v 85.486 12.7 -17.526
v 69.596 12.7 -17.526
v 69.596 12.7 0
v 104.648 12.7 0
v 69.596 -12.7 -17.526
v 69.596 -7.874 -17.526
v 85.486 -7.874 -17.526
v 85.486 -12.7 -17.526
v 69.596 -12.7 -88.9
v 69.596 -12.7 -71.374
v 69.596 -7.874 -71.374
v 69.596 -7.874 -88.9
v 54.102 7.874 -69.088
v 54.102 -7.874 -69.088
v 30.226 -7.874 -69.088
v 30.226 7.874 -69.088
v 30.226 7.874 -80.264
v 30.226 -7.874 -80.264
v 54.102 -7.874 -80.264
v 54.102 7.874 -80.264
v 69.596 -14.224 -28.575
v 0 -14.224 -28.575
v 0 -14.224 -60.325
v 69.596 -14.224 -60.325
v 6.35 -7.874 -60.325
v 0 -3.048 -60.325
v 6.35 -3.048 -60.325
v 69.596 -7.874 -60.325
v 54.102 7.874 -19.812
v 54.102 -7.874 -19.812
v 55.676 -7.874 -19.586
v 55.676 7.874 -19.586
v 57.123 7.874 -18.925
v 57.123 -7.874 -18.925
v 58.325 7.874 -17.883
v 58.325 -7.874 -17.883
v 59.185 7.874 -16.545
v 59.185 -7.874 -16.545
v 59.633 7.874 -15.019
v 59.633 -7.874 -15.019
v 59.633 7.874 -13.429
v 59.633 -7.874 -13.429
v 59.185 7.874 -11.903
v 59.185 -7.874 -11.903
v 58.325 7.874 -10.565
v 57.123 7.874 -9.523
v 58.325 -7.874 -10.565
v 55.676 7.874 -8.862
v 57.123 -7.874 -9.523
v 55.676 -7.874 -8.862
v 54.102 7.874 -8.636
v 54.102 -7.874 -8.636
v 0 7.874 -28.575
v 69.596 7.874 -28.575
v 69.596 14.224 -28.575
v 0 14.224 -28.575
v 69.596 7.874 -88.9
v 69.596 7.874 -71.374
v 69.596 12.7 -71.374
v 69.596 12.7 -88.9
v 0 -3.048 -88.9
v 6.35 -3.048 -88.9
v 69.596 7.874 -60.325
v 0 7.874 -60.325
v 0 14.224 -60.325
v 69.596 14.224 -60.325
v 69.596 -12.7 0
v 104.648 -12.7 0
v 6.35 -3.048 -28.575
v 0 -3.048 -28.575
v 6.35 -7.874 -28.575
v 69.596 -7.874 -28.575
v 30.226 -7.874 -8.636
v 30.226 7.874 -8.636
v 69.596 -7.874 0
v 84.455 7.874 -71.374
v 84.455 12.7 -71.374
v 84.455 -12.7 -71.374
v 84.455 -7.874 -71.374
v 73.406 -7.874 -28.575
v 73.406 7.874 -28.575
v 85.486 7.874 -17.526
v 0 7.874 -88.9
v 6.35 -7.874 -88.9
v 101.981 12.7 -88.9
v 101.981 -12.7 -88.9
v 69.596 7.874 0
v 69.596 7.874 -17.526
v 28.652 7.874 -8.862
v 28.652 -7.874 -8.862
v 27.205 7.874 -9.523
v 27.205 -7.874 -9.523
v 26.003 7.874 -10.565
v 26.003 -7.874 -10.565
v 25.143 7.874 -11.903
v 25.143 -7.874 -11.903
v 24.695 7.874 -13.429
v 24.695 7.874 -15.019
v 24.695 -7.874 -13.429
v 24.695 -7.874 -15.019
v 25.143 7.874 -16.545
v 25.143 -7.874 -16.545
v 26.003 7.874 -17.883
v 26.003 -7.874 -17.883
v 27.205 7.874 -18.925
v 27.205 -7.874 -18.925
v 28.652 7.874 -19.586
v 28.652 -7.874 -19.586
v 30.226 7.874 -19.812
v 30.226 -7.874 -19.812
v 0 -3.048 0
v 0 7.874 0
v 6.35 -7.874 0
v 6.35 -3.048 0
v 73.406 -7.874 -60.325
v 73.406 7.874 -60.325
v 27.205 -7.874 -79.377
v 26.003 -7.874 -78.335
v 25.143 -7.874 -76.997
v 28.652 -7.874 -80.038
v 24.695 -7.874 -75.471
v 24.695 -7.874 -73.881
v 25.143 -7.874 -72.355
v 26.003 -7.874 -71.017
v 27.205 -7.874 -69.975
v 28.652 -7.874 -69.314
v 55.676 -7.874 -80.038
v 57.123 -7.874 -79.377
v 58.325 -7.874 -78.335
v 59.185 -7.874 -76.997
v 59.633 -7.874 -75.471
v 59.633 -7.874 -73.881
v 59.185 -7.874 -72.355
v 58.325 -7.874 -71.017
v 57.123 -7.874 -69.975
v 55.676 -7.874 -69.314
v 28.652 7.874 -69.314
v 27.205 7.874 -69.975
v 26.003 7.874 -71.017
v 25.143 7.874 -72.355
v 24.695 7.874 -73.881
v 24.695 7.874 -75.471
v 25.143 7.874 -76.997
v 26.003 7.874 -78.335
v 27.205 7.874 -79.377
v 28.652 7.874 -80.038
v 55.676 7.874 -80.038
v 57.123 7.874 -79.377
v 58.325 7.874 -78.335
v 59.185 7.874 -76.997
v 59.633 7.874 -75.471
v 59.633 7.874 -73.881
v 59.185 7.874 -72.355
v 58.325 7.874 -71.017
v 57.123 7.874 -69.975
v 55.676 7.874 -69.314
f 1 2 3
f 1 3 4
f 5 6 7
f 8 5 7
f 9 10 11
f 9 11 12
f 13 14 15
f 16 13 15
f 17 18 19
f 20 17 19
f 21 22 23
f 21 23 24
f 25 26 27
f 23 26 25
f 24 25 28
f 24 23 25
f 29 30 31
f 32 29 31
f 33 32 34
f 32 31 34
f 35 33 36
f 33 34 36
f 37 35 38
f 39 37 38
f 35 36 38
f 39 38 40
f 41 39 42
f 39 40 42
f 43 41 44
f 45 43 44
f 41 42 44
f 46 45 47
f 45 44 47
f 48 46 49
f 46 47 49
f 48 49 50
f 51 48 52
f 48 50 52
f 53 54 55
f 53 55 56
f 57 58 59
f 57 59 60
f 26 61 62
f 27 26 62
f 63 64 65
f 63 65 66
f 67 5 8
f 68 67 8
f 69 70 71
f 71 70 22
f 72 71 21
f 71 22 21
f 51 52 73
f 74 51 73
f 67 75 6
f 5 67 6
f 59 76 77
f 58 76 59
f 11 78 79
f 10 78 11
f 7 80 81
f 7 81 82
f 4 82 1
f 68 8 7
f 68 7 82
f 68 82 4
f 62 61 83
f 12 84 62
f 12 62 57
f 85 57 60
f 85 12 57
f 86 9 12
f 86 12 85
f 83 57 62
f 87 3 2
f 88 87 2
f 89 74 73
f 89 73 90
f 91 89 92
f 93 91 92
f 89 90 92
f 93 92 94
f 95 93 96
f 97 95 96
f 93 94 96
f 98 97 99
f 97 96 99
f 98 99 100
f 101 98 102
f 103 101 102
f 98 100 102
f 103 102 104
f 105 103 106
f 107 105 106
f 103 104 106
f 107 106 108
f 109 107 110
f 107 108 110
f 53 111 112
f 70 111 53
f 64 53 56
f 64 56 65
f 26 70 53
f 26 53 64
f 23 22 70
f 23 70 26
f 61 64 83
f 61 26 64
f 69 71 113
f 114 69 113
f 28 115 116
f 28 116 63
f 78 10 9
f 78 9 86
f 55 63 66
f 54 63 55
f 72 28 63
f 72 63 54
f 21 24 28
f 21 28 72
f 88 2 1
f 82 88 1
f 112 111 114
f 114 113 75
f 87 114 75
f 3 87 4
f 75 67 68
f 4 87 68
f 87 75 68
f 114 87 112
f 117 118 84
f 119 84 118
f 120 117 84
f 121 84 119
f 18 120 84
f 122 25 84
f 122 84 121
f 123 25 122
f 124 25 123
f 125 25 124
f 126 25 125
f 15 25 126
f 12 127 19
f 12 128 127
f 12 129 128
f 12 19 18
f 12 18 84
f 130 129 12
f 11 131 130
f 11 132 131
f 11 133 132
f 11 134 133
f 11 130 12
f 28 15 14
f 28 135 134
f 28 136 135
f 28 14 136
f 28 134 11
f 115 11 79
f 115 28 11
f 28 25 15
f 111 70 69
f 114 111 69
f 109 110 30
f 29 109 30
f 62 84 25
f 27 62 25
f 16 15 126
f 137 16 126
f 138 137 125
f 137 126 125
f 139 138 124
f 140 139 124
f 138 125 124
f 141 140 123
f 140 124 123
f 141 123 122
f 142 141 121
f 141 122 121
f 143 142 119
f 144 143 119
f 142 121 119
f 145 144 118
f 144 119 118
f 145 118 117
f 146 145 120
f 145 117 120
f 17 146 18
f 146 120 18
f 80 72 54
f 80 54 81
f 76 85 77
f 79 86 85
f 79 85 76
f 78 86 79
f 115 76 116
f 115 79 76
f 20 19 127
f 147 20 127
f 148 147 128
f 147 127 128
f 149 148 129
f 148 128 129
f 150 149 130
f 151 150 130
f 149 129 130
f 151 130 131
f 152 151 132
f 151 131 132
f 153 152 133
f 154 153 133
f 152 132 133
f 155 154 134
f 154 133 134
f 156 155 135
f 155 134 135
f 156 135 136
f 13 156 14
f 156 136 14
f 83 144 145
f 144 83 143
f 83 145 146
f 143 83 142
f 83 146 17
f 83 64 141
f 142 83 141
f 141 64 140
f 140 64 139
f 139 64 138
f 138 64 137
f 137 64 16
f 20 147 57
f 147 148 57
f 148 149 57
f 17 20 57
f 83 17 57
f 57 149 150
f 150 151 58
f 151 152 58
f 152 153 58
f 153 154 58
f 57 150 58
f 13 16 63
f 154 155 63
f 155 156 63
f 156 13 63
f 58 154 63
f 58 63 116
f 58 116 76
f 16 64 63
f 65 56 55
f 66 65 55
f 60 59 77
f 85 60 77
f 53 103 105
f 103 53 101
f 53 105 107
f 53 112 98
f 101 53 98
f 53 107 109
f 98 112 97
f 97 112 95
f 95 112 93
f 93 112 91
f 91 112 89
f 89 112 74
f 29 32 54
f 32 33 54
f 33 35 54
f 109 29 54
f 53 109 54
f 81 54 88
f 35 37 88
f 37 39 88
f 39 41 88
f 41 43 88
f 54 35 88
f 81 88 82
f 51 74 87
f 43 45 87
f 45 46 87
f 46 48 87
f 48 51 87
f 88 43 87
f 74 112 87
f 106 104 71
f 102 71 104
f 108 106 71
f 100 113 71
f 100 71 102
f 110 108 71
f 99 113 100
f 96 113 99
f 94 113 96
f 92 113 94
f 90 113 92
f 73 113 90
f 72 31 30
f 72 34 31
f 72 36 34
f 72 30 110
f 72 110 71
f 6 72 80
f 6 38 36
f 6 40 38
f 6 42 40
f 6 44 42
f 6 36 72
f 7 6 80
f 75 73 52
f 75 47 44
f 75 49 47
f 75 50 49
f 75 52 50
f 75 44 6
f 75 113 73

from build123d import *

# Parameters (mm, degrees)
F1_DEPTH = 14.224
F2_DEPTH = 7.874
F3_DEPTH = 12.7
F0_W     = 6.35
F0_H     = 28.575
F4_DEPTH = 7.874
F5_W     = 6.35
F5_H     = 28.575
F6_DEPTH = 4.826
F8_DEPTH = 22.099


with BuildPart() as f1:
    # F0 (on Front) → F1 (new body, symmetric)
    with BuildSketch(Plane.XZ):
        Polygon((6.35, -28.575), (0, -28.575), (0, -44.45), (0, -60.325), (6.35, -60.325), (69.596, -60.325), (69.596, -28.575), align=None)
    extrude(amount=F1_DEPTH, both=True)

    # F0 (on Front) → F2 (join, symmetric)
    with BuildSketch(Plane.XZ):
        Polygon((69.596, -60.325), (6.35, -60.325), (6.35, -88.9), (69.596, -88.9), (69.596, -71.374), (84.455, -71.374), (73.406, -60.325), align=None)
        Polygon((69.596, 0), (6.35, 0), (6.35, -28.575), (69.596, -28.575), (73.406, -28.575), (85.48624, -17.526), (69.596, -17.526), align=None)
    extrude(amount=F2_DEPTH, both=True)

    # F0 (on Front) → F3 (join, symmetric)
    with BuildSketch(Plane.XZ):
        Polygon((104.648, 0), (69.596, 0), (69.596, -17.526), (85.48624, -17.526), align=None)
        Polygon((69.596, -71.374), (69.596, -88.9), (101.981, -88.9), (84.455, -71.374), align=None)
    extrude(amount=F3_DEPTH, both=True)

    # F0 (on Front) → F4 (join, symmetric)
    with BuildSketch(Plane.XZ):
        with Locations((3.175, -14.2875)):
            Rectangle(F0_W, F0_H)
        Polygon((6.35, -28.575), (0, -28.575), (0, -44.45), (0, -60.325), (6.35, -60.325), (69.596, -60.325), (69.596, -28.575), align=None)
        with Locations((3.175, -74.6125)):
            Rectangle(F0_W, F0_H)
    extrude(amount=F4_DEPTH, both=True)

    # F5 (on face) → F6 (cut)
    with BuildSketch(Plane.XZ.offset(7.874)):
        with Locations((3.175, -14.2875)):
            Rectangle(F5_W, F5_H)
        with Locations((3.175, -74.6125)):
            Rectangle(F5_W, F5_H)
    extrude(amount=-F6_DEPTH, mode=Mode.SUBTRACT)

    # F7 (on face) → F8 (cut, through all)
    with BuildSketch(Plane.XZ.offset(7.874)):
        with BuildLine():
            Line((54.102, -8.636), (30.226, -8.636))
            ThreePointArc((30.226, -8.636), (24.638, -14.224), (30.226, -19.812))
            Line((30.226, -19.812), (54.102, -19.812))
            ThreePointArc((54.102, -19.812), (59.69, -14.224), (54.102, -8.636))
        make_face()
        with BuildLine():
            ThreePointArc((30.226, -69.088), (24.638, -74.676), (30.226, -80.264))
            Line((30.226, -80.264), (54.102, -80.264))
            ThreePointArc((54.102, -80.264), (59.69, -74.676), (54.102, -69.088))
            Line((54.102, -69.088), (30.226, -69.088))
        make_face()
    extrude(amount=-F8_DEPTH, mode=Mode.SUBTRACT)


solid = f1.part
